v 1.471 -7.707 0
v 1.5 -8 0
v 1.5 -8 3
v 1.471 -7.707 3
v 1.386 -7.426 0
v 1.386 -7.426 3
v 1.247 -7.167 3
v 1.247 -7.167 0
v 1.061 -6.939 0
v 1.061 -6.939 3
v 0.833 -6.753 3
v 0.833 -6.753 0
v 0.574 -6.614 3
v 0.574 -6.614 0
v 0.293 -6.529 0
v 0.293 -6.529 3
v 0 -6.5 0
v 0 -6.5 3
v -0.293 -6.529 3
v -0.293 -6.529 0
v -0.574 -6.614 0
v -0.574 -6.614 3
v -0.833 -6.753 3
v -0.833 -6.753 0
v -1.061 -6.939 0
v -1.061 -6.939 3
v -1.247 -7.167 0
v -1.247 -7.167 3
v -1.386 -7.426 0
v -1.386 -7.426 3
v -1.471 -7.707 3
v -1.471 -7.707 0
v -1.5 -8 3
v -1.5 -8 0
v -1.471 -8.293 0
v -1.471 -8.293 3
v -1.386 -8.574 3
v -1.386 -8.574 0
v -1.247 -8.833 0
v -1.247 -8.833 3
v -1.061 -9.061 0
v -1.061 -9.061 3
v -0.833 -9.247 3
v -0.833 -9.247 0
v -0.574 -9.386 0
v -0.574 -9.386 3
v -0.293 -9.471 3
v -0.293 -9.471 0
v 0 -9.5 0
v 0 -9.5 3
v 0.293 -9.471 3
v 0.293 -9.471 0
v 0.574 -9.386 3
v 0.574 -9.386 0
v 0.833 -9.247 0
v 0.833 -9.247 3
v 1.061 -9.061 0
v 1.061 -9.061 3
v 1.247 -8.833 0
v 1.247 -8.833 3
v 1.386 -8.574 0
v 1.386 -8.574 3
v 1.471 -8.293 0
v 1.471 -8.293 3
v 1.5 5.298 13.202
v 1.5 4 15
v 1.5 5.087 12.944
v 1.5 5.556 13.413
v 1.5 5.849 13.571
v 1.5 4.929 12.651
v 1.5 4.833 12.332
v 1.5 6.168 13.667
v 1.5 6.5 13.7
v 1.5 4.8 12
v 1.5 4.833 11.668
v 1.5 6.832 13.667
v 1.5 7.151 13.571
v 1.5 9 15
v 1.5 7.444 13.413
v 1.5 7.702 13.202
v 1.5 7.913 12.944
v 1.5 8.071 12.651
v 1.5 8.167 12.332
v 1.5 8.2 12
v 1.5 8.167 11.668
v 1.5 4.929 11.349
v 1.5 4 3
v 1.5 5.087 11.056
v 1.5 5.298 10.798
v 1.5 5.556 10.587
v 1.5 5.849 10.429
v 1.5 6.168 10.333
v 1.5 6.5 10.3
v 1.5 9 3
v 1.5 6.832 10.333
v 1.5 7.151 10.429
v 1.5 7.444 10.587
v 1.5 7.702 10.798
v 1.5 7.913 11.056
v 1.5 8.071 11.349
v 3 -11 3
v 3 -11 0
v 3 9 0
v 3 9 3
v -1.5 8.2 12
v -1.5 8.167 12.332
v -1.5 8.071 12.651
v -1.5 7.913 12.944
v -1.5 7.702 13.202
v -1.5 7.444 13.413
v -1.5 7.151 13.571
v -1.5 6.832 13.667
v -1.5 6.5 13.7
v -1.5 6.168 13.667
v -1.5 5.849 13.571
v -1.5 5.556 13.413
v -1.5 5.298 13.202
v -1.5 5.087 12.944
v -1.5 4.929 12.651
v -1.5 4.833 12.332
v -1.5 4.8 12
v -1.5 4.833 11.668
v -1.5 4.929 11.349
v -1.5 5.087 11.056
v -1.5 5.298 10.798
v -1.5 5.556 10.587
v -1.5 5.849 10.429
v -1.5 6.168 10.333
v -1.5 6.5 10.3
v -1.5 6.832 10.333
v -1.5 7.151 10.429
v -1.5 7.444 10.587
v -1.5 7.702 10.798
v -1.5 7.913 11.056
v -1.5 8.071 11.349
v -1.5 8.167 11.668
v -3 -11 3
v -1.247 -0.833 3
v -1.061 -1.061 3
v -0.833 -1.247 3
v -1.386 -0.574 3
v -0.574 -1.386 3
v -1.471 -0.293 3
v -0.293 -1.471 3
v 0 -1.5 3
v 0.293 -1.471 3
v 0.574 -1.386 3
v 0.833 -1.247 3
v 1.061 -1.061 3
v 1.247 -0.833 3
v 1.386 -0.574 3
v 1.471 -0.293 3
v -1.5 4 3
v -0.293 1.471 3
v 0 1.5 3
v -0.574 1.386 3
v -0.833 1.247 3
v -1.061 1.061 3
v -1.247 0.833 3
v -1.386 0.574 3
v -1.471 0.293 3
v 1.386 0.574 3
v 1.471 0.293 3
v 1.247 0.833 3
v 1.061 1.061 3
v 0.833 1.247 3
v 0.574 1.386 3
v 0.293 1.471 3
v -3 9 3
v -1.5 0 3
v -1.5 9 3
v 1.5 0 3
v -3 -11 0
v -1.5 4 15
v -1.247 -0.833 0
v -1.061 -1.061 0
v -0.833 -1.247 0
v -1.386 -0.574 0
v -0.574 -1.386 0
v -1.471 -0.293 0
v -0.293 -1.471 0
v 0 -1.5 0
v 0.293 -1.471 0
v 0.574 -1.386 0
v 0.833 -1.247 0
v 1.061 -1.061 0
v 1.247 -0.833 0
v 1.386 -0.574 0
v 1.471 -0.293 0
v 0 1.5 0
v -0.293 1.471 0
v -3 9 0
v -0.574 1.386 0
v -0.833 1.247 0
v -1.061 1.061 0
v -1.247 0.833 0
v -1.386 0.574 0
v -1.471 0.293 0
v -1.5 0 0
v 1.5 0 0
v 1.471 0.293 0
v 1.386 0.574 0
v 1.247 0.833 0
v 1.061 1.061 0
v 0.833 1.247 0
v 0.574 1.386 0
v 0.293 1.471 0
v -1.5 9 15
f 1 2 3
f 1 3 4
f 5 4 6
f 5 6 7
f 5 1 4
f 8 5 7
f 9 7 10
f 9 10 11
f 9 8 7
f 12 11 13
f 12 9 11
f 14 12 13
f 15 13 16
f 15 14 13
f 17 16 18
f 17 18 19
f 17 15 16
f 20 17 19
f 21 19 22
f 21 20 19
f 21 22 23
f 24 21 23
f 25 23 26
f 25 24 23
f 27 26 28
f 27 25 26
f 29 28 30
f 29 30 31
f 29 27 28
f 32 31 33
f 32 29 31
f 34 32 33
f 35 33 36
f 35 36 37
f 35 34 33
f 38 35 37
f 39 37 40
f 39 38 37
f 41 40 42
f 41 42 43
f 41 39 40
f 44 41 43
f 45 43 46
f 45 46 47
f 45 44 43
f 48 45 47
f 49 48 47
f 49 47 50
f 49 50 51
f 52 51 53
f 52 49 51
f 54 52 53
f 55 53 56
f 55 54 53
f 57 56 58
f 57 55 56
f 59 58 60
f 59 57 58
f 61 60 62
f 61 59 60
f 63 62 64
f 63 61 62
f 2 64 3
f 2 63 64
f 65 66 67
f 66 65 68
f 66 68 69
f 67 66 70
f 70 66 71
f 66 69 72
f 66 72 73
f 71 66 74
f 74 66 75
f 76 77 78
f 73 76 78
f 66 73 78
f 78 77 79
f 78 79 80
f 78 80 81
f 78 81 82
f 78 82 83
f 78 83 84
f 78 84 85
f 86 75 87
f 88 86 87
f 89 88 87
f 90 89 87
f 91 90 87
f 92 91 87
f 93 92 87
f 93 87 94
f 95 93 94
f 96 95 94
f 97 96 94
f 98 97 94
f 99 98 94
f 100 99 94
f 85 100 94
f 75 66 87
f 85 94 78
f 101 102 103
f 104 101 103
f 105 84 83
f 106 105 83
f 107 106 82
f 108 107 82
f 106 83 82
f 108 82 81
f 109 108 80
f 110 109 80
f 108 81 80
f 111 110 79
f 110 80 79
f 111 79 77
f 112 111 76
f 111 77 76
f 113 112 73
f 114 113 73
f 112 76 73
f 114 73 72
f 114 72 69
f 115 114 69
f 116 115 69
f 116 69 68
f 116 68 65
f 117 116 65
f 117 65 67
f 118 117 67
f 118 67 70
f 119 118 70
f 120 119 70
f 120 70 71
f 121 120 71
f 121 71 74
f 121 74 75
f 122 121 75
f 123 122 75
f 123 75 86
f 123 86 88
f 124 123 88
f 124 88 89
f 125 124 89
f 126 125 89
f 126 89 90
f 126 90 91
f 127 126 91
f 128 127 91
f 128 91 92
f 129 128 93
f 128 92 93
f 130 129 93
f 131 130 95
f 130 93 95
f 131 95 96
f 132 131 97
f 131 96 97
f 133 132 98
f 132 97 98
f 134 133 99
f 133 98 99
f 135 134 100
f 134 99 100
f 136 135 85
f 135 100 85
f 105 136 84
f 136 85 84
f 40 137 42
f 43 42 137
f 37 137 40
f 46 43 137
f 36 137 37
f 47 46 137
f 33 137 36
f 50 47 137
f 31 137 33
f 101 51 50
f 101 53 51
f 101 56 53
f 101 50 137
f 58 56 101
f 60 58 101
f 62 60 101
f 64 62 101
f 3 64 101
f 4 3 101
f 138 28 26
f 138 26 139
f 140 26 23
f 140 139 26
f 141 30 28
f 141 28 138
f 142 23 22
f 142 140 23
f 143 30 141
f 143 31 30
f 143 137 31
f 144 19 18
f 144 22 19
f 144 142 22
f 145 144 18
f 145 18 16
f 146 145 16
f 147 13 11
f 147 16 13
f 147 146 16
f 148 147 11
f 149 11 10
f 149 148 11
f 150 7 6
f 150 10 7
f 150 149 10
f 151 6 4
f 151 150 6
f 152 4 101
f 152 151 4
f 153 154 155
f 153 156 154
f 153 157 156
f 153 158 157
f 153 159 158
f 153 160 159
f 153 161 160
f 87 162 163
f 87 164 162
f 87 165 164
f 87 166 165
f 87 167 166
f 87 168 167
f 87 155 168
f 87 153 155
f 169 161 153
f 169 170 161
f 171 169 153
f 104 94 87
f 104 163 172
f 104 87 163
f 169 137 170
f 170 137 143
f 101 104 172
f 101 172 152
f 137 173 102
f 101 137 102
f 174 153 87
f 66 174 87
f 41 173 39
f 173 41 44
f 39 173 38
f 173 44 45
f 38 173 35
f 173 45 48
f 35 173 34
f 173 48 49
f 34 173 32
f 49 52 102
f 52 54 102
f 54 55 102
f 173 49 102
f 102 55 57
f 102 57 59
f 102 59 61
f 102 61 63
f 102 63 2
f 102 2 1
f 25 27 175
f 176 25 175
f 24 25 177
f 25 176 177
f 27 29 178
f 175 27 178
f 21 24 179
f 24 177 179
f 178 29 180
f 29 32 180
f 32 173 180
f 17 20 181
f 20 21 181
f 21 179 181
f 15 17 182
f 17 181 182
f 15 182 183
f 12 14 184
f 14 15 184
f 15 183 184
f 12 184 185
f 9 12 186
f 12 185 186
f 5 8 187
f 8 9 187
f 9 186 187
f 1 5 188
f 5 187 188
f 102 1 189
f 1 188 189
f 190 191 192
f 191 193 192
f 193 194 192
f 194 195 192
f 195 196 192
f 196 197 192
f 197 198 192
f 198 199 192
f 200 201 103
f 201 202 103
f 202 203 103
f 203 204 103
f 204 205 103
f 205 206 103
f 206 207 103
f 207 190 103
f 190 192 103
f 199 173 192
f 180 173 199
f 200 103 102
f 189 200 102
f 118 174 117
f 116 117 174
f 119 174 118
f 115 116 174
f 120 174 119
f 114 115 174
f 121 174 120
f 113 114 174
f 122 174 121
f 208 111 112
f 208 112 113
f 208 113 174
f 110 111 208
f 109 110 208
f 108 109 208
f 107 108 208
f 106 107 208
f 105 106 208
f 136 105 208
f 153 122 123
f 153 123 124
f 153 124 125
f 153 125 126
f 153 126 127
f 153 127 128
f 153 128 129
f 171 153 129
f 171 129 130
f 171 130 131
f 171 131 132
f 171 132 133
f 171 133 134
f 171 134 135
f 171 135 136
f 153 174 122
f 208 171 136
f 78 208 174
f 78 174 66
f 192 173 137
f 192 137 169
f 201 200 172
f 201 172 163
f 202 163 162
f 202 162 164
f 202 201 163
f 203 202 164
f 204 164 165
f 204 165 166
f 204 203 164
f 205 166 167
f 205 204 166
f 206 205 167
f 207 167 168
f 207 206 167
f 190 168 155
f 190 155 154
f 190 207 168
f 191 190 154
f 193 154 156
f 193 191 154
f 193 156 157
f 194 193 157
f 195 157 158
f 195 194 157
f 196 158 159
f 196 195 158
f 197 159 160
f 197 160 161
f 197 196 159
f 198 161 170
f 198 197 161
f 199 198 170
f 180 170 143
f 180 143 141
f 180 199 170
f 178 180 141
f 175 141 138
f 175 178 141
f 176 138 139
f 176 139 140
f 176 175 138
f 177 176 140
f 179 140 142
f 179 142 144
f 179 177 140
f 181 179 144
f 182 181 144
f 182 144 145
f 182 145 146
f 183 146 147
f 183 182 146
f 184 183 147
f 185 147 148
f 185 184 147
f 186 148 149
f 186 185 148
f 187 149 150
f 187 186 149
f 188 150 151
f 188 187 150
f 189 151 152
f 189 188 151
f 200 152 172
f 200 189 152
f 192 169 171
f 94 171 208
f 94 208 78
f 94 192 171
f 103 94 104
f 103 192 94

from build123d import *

# Parameters (mm, degrees)
SKETCH4_W           = 6
SKETCH4_H           = 20
SKETCH4_R           = 1.5
BOSS_EXTRUDE1_DEPTH = 3
SKETCH6_W           = 3
SKETCH6_H           = 5
BOSS_EXTRUDE2_DEPTH = 12
SKETCH7_R           = 1.7
CUT_EXTRUDE1_DEPTH  = 20.137659209


with BuildPart() as part:
    # Sketch4 → Boss-Extrude1 (new body)
    with BuildSketch(Plane.XY):
        with Locations((0, -1)):
            Rectangle(SKETCH4_W, SKETCH4_H)
        Circle(SKETCH4_R, mode=Mode.SUBTRACT)
        with Locations((0, -8)):
            Circle(SKETCH4_R, mode=Mode.SUBTRACT)
    extrude(amount=BOSS_EXTRUDE1_DEPTH)

    # Sketch6 → Boss-Extrude2 (add)
    with BuildSketch(Plane.XY.offset(3)):
        with Locations((0, 6.5)):
            Rectangle(SKETCH6_W, SKETCH6_H)
    extrude(amount=BOSS_EXTRUDE2_DEPTH)

    # Sketch7 → Cut-Extrude1 (cut, through all)
    with BuildSketch(Plane(origin=(1.5, 0, 0), x_dir=(0, 0, -1), z_dir=(1, 0, 0))):
        with Locations(Location((-12, 6.5, 0), (0, 0, 90))):
            Circle(SKETCH7_R)
    extrude(amount=-CUT_EXTRUDE1_DEPTH, mode=Mode.SUBTRACT)


solid = part.part
